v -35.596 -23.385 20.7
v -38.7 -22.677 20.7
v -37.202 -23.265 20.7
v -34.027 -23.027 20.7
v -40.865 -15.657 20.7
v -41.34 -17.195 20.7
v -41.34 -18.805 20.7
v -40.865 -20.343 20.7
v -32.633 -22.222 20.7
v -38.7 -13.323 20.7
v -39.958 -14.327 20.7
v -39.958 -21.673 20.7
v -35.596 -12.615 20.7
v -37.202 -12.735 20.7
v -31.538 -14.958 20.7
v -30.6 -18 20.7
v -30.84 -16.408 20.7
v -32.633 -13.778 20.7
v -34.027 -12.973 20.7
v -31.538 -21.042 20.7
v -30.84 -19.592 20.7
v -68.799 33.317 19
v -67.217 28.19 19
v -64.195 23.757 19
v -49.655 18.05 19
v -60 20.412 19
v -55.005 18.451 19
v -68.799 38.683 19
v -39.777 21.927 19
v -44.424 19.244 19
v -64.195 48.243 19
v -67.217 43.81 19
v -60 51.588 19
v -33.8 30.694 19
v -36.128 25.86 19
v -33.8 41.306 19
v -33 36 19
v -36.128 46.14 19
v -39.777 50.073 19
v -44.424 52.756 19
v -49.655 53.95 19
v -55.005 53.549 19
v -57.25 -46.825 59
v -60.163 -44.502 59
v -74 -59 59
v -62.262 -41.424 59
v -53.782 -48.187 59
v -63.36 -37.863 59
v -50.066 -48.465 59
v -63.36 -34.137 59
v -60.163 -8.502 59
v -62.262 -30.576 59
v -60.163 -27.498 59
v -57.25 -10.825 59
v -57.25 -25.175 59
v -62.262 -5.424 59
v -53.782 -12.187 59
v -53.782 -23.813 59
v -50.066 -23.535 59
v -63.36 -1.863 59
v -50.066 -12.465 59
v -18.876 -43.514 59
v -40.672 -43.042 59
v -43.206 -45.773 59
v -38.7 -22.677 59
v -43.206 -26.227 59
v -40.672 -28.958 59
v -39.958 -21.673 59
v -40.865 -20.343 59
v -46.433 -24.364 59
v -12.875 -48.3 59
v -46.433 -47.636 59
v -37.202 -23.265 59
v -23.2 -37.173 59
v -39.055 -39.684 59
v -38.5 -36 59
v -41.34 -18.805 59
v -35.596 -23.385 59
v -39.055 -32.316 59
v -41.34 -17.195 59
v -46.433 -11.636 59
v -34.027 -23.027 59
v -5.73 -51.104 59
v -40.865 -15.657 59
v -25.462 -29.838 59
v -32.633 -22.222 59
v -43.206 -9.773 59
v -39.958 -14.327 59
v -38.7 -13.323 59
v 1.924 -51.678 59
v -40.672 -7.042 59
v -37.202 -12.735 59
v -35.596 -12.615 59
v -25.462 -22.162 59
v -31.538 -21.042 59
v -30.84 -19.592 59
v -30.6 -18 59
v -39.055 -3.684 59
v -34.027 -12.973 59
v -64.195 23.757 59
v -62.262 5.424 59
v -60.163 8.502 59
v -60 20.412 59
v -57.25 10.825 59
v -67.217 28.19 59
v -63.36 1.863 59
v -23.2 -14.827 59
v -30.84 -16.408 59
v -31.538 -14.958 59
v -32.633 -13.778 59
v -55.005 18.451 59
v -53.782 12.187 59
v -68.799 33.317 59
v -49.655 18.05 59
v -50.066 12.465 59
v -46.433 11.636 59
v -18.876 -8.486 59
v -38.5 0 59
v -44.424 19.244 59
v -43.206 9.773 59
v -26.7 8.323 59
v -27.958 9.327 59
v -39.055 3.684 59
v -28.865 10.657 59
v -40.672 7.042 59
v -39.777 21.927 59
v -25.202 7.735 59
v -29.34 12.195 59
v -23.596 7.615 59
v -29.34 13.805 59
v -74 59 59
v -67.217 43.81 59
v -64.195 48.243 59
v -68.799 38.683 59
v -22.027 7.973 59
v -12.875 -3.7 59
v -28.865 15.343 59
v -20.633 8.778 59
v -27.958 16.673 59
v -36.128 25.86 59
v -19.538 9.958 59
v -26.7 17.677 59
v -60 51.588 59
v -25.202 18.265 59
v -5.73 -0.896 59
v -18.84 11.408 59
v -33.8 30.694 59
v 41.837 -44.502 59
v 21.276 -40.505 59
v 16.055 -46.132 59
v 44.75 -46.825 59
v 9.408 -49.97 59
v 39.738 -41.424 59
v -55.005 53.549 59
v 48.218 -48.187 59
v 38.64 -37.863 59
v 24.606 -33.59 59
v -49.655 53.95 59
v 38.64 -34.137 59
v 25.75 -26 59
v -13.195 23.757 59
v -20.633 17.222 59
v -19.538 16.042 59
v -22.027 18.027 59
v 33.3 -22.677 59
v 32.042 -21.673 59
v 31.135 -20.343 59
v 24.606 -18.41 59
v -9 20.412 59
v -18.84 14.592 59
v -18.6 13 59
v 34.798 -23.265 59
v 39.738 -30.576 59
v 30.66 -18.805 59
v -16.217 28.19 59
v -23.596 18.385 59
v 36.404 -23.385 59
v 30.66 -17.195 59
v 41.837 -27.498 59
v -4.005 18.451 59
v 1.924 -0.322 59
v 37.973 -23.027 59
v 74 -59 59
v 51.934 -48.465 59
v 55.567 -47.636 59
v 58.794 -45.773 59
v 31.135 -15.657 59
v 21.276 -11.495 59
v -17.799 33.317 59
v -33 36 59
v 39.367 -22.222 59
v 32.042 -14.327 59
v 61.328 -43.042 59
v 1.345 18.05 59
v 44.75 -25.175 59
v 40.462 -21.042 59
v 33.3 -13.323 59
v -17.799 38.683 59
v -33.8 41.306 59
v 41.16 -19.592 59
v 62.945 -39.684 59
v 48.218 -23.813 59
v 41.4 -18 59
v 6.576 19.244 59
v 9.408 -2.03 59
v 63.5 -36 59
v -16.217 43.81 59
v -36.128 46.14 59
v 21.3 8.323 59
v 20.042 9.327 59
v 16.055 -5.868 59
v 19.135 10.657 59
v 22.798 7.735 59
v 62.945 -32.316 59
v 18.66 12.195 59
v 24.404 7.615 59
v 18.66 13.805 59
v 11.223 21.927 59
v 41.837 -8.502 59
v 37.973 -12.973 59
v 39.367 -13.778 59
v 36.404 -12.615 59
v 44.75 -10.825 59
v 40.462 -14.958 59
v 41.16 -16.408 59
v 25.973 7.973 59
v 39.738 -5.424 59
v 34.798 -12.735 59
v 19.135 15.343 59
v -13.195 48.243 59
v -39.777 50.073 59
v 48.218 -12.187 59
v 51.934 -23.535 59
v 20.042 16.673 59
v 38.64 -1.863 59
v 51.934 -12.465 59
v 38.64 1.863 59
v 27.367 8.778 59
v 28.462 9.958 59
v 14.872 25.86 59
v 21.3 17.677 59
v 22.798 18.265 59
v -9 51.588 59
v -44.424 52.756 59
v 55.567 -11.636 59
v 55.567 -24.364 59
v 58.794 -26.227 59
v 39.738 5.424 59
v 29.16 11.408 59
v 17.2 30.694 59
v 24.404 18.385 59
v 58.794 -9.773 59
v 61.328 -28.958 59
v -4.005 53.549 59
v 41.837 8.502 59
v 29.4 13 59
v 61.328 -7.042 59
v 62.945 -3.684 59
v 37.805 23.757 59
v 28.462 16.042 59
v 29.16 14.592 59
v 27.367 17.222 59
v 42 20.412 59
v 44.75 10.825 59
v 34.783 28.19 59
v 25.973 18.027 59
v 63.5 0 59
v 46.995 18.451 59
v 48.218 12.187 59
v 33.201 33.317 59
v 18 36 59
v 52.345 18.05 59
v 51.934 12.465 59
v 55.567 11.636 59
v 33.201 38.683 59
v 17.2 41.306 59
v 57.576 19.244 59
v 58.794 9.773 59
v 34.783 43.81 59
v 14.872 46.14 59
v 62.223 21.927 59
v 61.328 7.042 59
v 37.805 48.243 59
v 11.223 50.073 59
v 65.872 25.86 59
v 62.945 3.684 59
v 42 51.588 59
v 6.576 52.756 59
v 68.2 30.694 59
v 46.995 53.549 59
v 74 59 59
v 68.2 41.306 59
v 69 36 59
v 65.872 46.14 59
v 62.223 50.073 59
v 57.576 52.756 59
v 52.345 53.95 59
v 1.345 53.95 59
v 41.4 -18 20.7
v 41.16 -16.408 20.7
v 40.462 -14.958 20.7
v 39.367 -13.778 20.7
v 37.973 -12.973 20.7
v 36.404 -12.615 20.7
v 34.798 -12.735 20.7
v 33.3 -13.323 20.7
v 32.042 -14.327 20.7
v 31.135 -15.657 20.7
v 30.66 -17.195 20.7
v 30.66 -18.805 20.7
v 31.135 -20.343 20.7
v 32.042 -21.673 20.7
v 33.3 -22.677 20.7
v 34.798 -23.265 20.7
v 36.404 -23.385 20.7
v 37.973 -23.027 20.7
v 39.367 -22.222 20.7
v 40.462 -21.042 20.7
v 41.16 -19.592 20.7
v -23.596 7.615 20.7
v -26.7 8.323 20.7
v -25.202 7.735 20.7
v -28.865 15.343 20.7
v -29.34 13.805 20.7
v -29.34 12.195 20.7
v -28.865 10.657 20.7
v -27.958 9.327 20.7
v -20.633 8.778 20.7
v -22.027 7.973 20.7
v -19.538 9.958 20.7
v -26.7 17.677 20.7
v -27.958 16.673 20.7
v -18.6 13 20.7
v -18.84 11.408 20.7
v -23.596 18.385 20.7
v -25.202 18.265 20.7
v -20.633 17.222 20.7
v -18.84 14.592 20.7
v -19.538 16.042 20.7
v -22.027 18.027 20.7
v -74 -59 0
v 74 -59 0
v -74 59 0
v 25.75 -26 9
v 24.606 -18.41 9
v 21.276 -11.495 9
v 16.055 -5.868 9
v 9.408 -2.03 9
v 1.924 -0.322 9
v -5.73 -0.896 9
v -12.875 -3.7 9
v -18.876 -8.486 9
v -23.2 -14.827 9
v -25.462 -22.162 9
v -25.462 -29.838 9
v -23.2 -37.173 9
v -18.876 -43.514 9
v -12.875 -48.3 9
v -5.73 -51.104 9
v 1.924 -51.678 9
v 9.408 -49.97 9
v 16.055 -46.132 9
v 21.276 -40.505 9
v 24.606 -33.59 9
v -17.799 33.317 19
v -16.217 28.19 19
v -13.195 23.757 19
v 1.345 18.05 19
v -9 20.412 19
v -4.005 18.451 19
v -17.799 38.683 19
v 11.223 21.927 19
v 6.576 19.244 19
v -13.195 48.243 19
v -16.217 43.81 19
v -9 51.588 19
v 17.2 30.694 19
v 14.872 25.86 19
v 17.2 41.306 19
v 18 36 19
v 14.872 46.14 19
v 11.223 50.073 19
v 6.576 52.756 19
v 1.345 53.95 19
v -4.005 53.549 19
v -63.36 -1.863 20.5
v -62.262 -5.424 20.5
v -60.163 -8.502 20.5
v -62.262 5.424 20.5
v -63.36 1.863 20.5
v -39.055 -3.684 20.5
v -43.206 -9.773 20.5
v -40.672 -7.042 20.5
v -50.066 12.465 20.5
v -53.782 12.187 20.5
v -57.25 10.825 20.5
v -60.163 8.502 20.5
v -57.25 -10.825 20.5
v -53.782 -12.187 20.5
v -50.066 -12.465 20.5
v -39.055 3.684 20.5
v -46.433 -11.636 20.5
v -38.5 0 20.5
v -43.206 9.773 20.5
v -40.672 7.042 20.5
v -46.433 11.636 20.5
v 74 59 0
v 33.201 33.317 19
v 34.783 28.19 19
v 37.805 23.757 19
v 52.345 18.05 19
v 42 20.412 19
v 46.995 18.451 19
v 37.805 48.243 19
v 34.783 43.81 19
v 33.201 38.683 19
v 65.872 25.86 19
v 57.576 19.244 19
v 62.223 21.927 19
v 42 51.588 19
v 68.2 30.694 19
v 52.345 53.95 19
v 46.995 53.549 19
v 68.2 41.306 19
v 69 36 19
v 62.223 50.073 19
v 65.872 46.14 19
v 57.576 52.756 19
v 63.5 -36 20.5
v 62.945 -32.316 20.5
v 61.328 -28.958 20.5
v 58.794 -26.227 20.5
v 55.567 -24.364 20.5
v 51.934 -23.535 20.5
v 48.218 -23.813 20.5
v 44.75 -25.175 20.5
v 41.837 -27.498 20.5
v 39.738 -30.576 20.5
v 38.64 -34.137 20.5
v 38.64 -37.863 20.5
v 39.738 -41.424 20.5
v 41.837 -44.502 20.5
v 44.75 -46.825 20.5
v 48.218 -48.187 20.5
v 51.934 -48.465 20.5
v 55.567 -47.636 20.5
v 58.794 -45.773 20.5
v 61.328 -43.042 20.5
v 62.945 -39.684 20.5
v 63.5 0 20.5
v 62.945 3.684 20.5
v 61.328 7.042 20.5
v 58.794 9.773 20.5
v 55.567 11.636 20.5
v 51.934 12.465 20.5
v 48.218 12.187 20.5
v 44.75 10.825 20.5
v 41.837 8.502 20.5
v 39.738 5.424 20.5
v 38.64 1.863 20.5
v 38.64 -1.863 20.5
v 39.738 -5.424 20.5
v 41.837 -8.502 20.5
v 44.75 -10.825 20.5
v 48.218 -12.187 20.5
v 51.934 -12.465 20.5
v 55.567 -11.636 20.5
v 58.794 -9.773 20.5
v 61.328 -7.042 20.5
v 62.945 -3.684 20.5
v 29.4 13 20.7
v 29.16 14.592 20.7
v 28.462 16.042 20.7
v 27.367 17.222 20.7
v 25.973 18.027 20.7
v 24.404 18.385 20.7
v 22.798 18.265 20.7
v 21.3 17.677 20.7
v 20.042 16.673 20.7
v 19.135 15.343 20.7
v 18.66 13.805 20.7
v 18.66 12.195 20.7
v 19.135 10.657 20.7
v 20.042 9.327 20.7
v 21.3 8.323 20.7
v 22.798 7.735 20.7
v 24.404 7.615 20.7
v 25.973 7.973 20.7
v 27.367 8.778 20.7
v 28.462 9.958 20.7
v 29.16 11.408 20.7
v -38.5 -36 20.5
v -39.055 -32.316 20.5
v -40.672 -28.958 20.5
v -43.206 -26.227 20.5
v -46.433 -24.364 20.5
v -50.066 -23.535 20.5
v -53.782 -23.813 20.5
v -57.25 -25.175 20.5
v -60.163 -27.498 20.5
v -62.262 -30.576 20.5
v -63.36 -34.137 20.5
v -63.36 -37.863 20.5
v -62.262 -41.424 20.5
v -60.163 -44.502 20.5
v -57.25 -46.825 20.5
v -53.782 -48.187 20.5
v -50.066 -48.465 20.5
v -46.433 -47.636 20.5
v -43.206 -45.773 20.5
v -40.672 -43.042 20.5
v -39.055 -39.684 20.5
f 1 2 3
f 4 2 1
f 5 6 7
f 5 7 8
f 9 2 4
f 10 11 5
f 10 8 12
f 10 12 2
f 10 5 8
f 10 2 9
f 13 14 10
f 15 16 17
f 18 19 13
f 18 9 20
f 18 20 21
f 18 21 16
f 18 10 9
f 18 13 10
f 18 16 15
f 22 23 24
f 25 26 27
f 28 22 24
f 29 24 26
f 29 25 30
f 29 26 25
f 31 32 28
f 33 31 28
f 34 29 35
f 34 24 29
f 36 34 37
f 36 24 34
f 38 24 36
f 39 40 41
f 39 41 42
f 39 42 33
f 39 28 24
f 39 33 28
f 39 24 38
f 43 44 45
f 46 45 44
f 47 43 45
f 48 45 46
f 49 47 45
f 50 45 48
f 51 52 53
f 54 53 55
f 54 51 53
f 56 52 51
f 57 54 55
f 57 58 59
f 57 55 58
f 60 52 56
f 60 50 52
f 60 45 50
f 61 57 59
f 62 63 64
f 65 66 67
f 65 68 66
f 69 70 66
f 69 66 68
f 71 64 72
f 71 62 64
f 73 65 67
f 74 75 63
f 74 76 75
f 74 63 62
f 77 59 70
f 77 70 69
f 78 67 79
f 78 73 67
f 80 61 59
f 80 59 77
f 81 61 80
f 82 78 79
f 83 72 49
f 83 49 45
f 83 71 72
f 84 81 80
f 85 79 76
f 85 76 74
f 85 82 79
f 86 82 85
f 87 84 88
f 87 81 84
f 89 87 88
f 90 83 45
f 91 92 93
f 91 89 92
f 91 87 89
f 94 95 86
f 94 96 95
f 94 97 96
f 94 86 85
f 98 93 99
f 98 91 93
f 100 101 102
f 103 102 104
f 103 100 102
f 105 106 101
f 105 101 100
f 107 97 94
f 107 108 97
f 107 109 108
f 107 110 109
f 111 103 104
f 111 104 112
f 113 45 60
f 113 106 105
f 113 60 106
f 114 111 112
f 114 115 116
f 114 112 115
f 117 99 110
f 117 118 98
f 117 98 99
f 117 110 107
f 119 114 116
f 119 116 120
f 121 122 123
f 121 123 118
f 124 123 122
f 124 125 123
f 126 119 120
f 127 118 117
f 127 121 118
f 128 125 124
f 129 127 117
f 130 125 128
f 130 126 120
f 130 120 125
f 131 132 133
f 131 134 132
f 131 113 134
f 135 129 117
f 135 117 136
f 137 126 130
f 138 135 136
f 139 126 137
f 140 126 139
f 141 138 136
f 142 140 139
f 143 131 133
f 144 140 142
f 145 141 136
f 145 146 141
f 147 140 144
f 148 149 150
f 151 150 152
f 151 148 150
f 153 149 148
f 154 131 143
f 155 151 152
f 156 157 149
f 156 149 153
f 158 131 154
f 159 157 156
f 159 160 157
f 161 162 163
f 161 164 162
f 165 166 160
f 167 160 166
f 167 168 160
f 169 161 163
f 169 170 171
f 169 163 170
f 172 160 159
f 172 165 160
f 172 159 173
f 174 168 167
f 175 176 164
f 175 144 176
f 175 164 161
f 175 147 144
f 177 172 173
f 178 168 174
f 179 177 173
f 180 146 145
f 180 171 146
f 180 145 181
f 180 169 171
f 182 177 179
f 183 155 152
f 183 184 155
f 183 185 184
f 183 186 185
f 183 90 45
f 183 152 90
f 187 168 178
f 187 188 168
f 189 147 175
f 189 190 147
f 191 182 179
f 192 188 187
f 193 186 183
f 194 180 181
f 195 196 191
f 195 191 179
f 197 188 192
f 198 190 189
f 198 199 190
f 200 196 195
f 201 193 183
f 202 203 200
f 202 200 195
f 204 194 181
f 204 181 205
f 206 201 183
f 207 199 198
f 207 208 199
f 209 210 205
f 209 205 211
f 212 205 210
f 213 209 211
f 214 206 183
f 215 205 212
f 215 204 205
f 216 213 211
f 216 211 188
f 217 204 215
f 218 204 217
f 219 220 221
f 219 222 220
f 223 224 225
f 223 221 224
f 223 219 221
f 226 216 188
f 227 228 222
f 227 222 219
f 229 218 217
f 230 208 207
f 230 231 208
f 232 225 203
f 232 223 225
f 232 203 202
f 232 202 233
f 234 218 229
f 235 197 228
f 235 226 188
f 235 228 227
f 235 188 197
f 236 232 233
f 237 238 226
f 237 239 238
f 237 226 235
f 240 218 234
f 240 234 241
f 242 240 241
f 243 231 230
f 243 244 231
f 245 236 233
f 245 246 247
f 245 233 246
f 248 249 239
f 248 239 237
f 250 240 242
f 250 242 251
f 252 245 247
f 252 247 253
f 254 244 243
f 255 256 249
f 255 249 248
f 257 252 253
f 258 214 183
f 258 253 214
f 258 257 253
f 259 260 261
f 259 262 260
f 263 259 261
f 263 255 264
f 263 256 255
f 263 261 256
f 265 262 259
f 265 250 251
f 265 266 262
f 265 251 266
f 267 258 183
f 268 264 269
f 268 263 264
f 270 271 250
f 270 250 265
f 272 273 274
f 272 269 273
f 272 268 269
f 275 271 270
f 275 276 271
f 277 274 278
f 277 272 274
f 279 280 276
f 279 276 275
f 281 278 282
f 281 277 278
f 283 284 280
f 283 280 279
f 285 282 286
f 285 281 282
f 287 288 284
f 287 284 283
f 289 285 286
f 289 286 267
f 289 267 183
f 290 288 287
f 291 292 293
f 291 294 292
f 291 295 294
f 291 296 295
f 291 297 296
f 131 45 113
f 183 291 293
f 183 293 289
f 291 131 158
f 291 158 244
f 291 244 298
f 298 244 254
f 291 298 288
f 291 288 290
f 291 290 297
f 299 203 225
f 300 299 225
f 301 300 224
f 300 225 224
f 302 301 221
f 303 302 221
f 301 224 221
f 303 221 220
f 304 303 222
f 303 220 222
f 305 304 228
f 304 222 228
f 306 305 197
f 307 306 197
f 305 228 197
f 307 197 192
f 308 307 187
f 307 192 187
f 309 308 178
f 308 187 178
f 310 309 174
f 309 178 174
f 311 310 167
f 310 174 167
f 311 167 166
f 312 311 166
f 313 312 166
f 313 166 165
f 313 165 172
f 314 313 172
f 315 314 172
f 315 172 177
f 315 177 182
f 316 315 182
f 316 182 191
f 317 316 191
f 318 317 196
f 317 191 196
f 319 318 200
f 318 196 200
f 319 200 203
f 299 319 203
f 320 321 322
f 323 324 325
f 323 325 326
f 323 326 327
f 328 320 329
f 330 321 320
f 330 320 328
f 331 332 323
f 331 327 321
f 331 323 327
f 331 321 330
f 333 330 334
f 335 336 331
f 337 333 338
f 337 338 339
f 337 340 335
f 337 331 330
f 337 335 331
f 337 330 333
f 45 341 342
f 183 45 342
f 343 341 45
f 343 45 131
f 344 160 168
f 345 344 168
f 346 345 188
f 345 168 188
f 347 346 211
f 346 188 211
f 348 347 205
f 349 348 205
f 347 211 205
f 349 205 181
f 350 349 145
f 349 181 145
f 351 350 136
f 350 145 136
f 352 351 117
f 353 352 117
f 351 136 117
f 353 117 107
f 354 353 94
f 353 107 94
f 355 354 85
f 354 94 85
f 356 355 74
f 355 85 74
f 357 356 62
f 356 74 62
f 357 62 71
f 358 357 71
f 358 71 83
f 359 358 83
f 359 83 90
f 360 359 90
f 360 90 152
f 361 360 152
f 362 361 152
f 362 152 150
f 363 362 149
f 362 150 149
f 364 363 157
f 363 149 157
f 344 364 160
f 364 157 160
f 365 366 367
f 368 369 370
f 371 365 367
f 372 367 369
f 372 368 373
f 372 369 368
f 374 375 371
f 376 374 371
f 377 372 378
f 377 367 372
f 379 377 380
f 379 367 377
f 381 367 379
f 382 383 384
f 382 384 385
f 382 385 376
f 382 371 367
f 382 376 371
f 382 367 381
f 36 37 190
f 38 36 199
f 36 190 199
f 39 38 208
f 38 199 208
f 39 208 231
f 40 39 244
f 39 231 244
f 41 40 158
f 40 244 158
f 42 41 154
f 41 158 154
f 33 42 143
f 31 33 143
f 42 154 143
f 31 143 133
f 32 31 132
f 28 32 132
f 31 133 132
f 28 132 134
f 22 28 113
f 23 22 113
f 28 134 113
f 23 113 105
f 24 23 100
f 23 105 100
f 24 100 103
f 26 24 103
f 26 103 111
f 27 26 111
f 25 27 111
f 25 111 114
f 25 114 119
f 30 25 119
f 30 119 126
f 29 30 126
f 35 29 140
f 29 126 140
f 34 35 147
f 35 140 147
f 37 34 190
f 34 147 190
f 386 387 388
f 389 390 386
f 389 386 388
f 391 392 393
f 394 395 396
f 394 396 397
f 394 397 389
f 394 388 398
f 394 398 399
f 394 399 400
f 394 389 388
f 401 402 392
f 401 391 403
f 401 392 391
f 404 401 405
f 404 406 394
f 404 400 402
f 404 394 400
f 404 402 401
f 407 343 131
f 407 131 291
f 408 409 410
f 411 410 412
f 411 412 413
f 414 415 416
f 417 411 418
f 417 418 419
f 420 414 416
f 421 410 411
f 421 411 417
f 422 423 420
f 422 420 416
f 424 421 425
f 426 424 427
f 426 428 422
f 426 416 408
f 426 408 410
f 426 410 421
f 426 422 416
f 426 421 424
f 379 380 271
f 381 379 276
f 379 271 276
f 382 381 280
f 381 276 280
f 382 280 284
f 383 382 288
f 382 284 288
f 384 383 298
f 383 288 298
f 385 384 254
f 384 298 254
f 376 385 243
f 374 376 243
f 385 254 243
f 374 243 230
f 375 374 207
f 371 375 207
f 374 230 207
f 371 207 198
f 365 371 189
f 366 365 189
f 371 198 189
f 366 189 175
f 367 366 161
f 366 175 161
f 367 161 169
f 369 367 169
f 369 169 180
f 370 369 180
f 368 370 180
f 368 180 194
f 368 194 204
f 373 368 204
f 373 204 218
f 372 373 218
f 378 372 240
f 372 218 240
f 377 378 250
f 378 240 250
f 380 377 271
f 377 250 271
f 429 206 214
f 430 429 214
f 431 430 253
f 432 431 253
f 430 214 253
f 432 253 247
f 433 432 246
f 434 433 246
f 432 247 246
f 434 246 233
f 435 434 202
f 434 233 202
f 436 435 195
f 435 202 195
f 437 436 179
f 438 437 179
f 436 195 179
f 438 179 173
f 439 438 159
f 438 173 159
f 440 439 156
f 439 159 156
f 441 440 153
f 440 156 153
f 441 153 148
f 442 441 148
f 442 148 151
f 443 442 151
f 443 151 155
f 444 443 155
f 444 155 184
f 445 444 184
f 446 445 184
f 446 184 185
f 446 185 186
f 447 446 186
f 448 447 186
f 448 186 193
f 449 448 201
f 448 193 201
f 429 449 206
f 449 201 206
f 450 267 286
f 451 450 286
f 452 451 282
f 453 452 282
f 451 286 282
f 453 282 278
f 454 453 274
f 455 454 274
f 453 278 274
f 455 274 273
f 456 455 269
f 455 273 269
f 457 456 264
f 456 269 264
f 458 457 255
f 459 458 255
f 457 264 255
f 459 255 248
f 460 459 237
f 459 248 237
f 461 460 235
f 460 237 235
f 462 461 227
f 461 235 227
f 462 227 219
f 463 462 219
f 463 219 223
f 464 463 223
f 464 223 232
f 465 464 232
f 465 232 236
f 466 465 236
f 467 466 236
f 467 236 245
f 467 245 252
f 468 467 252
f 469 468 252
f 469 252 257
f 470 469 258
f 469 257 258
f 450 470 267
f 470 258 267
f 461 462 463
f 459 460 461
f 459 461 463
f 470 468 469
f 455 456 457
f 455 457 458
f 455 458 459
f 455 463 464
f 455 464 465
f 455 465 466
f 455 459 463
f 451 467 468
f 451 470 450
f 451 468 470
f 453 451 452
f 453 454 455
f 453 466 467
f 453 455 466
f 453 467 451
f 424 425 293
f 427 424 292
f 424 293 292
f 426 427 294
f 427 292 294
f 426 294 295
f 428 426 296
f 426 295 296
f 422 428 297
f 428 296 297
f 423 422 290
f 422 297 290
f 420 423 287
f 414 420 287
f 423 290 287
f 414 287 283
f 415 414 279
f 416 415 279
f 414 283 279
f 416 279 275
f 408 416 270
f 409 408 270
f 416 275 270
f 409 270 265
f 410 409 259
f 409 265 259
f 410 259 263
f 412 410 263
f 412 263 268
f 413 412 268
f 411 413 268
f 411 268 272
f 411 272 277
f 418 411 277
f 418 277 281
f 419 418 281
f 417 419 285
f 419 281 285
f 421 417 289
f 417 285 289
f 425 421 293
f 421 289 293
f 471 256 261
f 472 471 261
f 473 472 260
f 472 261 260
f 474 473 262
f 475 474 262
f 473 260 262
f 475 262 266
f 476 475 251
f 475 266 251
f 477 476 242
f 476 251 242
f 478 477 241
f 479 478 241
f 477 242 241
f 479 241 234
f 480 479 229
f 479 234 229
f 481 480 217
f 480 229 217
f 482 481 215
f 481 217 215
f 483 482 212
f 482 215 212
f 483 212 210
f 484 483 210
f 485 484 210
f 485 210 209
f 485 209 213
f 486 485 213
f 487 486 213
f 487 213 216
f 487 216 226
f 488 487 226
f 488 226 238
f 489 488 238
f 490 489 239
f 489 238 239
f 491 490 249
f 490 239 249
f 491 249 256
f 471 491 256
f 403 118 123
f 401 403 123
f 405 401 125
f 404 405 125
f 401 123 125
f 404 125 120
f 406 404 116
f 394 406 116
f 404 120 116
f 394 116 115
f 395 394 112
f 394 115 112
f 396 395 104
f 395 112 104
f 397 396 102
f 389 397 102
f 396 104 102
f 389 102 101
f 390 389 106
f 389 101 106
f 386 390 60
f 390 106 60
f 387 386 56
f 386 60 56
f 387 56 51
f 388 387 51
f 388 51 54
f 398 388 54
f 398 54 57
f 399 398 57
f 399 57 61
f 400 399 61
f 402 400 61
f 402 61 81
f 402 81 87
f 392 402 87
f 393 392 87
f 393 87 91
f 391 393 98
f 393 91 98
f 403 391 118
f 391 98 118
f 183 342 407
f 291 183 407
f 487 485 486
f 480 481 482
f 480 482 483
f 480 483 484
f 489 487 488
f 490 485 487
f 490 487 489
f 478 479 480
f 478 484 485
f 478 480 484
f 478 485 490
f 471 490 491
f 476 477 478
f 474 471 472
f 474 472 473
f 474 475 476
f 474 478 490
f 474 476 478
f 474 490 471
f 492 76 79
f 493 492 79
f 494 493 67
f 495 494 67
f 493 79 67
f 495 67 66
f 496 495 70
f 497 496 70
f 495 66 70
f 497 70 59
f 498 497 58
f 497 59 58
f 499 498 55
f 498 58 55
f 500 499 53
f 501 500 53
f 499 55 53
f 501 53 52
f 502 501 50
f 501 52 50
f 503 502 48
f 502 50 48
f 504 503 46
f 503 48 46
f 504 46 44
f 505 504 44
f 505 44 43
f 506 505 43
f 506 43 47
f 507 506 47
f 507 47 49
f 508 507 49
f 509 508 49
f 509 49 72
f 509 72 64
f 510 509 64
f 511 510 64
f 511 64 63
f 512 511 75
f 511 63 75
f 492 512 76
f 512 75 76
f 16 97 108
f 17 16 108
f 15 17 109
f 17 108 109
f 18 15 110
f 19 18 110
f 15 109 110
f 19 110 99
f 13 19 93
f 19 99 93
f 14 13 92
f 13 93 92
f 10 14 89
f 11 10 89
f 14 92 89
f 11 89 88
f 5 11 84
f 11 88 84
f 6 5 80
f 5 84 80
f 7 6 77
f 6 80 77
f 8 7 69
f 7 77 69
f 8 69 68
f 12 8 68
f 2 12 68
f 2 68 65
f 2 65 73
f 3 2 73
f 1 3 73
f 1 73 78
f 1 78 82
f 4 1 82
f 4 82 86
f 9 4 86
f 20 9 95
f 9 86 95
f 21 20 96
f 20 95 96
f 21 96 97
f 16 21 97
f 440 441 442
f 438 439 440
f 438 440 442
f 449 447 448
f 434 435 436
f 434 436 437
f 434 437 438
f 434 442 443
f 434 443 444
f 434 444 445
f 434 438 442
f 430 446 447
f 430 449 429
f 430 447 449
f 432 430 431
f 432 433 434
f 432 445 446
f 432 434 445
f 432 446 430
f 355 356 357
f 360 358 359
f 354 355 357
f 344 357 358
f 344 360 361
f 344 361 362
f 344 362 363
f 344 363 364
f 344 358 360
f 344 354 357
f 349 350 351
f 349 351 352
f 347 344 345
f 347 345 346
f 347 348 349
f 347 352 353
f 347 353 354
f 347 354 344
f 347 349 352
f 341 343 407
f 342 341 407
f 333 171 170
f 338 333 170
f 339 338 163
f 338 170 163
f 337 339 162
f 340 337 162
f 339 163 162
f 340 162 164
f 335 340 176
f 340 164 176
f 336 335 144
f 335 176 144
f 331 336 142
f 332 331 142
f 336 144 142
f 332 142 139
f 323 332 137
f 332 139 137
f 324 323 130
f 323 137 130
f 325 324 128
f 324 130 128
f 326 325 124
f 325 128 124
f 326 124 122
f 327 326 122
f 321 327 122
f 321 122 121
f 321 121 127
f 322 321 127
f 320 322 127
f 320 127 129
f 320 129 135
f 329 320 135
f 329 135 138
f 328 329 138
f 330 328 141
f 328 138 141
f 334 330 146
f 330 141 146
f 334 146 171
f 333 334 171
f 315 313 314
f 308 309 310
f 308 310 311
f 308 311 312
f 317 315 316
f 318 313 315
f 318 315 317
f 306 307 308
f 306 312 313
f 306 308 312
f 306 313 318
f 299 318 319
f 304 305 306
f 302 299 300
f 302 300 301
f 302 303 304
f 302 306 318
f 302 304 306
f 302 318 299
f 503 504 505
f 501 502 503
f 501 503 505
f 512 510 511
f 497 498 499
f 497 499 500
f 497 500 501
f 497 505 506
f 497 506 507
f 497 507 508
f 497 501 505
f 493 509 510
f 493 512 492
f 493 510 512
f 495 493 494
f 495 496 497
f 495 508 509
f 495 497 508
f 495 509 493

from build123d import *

# Parameters (mm, degrees)
F0_W     = 148
F0_H     = 118
F1_DEPTH = 59
F2_R     = 25.75
F3_DEPTH = 50
F2_R_2   = 18
F4_DEPTH = 40
F2_R_3   = 12.5
F5_DEPTH = 38.5
F2_R_4   = 5.4
F6_DEPTH = 38.3


with BuildPart() as f1:
    # F0 (on Top) → F1 (new body)
    with BuildSketch(Plane.XY):
        Rectangle(F0_W, F0_H)
    extrude(amount=F1_DEPTH)

    # F2 (on face) → F3 (cut)
    with BuildSketch(Plane.XY.offset(59)):
        with Locations((0, -26)):
            Circle(F2_R)
    extrude(amount=-F3_DEPTH, mode=Mode.SUBTRACT)

    # F2 (on face) → F4 (cut)
    with BuildSketch(Plane.XY.offset(59)):
        with Locations((-51, 36)):
            Circle(F2_R_2)
        with Locations((0, 36)):
            Circle(F2_R_2)
        with Locations((51, 36)):
            Circle(F2_R_2)
    extrude(amount=-F4_DEPTH, mode=Mode.SUBTRACT)

    # F2 (on face) → F5 (cut)
    with BuildSketch(Plane.XY.offset(59)):
        with Locations((-51, 0)):
            Circle(F2_R_3)
        with Locations((-51, -36)):
            Circle(F2_R_3)
        with Locations((51, 0)):
            Circle(F2_R_3)
        with Locations((51, -36)):
            Circle(F2_R_3)
    extrude(amount=-F5_DEPTH, mode=Mode.SUBTRACT)

    # F2 (on face) → F6 (cut)
    with BuildSketch(Plane.XY.offset(59)):
        with Locations((-24, 13)):
            Circle(F2_R_4)
        with Locations((-36, -18)):
            Circle(F2_R_4)
        with Locations((24, 13)):
            Circle(F2_R_4)
        with Locations((36, -18)):
            Circle(F2_R_4)
    extrude(amount=-F6_DEPTH, mode=Mode.SUBTRACT)


solid = f1.part
